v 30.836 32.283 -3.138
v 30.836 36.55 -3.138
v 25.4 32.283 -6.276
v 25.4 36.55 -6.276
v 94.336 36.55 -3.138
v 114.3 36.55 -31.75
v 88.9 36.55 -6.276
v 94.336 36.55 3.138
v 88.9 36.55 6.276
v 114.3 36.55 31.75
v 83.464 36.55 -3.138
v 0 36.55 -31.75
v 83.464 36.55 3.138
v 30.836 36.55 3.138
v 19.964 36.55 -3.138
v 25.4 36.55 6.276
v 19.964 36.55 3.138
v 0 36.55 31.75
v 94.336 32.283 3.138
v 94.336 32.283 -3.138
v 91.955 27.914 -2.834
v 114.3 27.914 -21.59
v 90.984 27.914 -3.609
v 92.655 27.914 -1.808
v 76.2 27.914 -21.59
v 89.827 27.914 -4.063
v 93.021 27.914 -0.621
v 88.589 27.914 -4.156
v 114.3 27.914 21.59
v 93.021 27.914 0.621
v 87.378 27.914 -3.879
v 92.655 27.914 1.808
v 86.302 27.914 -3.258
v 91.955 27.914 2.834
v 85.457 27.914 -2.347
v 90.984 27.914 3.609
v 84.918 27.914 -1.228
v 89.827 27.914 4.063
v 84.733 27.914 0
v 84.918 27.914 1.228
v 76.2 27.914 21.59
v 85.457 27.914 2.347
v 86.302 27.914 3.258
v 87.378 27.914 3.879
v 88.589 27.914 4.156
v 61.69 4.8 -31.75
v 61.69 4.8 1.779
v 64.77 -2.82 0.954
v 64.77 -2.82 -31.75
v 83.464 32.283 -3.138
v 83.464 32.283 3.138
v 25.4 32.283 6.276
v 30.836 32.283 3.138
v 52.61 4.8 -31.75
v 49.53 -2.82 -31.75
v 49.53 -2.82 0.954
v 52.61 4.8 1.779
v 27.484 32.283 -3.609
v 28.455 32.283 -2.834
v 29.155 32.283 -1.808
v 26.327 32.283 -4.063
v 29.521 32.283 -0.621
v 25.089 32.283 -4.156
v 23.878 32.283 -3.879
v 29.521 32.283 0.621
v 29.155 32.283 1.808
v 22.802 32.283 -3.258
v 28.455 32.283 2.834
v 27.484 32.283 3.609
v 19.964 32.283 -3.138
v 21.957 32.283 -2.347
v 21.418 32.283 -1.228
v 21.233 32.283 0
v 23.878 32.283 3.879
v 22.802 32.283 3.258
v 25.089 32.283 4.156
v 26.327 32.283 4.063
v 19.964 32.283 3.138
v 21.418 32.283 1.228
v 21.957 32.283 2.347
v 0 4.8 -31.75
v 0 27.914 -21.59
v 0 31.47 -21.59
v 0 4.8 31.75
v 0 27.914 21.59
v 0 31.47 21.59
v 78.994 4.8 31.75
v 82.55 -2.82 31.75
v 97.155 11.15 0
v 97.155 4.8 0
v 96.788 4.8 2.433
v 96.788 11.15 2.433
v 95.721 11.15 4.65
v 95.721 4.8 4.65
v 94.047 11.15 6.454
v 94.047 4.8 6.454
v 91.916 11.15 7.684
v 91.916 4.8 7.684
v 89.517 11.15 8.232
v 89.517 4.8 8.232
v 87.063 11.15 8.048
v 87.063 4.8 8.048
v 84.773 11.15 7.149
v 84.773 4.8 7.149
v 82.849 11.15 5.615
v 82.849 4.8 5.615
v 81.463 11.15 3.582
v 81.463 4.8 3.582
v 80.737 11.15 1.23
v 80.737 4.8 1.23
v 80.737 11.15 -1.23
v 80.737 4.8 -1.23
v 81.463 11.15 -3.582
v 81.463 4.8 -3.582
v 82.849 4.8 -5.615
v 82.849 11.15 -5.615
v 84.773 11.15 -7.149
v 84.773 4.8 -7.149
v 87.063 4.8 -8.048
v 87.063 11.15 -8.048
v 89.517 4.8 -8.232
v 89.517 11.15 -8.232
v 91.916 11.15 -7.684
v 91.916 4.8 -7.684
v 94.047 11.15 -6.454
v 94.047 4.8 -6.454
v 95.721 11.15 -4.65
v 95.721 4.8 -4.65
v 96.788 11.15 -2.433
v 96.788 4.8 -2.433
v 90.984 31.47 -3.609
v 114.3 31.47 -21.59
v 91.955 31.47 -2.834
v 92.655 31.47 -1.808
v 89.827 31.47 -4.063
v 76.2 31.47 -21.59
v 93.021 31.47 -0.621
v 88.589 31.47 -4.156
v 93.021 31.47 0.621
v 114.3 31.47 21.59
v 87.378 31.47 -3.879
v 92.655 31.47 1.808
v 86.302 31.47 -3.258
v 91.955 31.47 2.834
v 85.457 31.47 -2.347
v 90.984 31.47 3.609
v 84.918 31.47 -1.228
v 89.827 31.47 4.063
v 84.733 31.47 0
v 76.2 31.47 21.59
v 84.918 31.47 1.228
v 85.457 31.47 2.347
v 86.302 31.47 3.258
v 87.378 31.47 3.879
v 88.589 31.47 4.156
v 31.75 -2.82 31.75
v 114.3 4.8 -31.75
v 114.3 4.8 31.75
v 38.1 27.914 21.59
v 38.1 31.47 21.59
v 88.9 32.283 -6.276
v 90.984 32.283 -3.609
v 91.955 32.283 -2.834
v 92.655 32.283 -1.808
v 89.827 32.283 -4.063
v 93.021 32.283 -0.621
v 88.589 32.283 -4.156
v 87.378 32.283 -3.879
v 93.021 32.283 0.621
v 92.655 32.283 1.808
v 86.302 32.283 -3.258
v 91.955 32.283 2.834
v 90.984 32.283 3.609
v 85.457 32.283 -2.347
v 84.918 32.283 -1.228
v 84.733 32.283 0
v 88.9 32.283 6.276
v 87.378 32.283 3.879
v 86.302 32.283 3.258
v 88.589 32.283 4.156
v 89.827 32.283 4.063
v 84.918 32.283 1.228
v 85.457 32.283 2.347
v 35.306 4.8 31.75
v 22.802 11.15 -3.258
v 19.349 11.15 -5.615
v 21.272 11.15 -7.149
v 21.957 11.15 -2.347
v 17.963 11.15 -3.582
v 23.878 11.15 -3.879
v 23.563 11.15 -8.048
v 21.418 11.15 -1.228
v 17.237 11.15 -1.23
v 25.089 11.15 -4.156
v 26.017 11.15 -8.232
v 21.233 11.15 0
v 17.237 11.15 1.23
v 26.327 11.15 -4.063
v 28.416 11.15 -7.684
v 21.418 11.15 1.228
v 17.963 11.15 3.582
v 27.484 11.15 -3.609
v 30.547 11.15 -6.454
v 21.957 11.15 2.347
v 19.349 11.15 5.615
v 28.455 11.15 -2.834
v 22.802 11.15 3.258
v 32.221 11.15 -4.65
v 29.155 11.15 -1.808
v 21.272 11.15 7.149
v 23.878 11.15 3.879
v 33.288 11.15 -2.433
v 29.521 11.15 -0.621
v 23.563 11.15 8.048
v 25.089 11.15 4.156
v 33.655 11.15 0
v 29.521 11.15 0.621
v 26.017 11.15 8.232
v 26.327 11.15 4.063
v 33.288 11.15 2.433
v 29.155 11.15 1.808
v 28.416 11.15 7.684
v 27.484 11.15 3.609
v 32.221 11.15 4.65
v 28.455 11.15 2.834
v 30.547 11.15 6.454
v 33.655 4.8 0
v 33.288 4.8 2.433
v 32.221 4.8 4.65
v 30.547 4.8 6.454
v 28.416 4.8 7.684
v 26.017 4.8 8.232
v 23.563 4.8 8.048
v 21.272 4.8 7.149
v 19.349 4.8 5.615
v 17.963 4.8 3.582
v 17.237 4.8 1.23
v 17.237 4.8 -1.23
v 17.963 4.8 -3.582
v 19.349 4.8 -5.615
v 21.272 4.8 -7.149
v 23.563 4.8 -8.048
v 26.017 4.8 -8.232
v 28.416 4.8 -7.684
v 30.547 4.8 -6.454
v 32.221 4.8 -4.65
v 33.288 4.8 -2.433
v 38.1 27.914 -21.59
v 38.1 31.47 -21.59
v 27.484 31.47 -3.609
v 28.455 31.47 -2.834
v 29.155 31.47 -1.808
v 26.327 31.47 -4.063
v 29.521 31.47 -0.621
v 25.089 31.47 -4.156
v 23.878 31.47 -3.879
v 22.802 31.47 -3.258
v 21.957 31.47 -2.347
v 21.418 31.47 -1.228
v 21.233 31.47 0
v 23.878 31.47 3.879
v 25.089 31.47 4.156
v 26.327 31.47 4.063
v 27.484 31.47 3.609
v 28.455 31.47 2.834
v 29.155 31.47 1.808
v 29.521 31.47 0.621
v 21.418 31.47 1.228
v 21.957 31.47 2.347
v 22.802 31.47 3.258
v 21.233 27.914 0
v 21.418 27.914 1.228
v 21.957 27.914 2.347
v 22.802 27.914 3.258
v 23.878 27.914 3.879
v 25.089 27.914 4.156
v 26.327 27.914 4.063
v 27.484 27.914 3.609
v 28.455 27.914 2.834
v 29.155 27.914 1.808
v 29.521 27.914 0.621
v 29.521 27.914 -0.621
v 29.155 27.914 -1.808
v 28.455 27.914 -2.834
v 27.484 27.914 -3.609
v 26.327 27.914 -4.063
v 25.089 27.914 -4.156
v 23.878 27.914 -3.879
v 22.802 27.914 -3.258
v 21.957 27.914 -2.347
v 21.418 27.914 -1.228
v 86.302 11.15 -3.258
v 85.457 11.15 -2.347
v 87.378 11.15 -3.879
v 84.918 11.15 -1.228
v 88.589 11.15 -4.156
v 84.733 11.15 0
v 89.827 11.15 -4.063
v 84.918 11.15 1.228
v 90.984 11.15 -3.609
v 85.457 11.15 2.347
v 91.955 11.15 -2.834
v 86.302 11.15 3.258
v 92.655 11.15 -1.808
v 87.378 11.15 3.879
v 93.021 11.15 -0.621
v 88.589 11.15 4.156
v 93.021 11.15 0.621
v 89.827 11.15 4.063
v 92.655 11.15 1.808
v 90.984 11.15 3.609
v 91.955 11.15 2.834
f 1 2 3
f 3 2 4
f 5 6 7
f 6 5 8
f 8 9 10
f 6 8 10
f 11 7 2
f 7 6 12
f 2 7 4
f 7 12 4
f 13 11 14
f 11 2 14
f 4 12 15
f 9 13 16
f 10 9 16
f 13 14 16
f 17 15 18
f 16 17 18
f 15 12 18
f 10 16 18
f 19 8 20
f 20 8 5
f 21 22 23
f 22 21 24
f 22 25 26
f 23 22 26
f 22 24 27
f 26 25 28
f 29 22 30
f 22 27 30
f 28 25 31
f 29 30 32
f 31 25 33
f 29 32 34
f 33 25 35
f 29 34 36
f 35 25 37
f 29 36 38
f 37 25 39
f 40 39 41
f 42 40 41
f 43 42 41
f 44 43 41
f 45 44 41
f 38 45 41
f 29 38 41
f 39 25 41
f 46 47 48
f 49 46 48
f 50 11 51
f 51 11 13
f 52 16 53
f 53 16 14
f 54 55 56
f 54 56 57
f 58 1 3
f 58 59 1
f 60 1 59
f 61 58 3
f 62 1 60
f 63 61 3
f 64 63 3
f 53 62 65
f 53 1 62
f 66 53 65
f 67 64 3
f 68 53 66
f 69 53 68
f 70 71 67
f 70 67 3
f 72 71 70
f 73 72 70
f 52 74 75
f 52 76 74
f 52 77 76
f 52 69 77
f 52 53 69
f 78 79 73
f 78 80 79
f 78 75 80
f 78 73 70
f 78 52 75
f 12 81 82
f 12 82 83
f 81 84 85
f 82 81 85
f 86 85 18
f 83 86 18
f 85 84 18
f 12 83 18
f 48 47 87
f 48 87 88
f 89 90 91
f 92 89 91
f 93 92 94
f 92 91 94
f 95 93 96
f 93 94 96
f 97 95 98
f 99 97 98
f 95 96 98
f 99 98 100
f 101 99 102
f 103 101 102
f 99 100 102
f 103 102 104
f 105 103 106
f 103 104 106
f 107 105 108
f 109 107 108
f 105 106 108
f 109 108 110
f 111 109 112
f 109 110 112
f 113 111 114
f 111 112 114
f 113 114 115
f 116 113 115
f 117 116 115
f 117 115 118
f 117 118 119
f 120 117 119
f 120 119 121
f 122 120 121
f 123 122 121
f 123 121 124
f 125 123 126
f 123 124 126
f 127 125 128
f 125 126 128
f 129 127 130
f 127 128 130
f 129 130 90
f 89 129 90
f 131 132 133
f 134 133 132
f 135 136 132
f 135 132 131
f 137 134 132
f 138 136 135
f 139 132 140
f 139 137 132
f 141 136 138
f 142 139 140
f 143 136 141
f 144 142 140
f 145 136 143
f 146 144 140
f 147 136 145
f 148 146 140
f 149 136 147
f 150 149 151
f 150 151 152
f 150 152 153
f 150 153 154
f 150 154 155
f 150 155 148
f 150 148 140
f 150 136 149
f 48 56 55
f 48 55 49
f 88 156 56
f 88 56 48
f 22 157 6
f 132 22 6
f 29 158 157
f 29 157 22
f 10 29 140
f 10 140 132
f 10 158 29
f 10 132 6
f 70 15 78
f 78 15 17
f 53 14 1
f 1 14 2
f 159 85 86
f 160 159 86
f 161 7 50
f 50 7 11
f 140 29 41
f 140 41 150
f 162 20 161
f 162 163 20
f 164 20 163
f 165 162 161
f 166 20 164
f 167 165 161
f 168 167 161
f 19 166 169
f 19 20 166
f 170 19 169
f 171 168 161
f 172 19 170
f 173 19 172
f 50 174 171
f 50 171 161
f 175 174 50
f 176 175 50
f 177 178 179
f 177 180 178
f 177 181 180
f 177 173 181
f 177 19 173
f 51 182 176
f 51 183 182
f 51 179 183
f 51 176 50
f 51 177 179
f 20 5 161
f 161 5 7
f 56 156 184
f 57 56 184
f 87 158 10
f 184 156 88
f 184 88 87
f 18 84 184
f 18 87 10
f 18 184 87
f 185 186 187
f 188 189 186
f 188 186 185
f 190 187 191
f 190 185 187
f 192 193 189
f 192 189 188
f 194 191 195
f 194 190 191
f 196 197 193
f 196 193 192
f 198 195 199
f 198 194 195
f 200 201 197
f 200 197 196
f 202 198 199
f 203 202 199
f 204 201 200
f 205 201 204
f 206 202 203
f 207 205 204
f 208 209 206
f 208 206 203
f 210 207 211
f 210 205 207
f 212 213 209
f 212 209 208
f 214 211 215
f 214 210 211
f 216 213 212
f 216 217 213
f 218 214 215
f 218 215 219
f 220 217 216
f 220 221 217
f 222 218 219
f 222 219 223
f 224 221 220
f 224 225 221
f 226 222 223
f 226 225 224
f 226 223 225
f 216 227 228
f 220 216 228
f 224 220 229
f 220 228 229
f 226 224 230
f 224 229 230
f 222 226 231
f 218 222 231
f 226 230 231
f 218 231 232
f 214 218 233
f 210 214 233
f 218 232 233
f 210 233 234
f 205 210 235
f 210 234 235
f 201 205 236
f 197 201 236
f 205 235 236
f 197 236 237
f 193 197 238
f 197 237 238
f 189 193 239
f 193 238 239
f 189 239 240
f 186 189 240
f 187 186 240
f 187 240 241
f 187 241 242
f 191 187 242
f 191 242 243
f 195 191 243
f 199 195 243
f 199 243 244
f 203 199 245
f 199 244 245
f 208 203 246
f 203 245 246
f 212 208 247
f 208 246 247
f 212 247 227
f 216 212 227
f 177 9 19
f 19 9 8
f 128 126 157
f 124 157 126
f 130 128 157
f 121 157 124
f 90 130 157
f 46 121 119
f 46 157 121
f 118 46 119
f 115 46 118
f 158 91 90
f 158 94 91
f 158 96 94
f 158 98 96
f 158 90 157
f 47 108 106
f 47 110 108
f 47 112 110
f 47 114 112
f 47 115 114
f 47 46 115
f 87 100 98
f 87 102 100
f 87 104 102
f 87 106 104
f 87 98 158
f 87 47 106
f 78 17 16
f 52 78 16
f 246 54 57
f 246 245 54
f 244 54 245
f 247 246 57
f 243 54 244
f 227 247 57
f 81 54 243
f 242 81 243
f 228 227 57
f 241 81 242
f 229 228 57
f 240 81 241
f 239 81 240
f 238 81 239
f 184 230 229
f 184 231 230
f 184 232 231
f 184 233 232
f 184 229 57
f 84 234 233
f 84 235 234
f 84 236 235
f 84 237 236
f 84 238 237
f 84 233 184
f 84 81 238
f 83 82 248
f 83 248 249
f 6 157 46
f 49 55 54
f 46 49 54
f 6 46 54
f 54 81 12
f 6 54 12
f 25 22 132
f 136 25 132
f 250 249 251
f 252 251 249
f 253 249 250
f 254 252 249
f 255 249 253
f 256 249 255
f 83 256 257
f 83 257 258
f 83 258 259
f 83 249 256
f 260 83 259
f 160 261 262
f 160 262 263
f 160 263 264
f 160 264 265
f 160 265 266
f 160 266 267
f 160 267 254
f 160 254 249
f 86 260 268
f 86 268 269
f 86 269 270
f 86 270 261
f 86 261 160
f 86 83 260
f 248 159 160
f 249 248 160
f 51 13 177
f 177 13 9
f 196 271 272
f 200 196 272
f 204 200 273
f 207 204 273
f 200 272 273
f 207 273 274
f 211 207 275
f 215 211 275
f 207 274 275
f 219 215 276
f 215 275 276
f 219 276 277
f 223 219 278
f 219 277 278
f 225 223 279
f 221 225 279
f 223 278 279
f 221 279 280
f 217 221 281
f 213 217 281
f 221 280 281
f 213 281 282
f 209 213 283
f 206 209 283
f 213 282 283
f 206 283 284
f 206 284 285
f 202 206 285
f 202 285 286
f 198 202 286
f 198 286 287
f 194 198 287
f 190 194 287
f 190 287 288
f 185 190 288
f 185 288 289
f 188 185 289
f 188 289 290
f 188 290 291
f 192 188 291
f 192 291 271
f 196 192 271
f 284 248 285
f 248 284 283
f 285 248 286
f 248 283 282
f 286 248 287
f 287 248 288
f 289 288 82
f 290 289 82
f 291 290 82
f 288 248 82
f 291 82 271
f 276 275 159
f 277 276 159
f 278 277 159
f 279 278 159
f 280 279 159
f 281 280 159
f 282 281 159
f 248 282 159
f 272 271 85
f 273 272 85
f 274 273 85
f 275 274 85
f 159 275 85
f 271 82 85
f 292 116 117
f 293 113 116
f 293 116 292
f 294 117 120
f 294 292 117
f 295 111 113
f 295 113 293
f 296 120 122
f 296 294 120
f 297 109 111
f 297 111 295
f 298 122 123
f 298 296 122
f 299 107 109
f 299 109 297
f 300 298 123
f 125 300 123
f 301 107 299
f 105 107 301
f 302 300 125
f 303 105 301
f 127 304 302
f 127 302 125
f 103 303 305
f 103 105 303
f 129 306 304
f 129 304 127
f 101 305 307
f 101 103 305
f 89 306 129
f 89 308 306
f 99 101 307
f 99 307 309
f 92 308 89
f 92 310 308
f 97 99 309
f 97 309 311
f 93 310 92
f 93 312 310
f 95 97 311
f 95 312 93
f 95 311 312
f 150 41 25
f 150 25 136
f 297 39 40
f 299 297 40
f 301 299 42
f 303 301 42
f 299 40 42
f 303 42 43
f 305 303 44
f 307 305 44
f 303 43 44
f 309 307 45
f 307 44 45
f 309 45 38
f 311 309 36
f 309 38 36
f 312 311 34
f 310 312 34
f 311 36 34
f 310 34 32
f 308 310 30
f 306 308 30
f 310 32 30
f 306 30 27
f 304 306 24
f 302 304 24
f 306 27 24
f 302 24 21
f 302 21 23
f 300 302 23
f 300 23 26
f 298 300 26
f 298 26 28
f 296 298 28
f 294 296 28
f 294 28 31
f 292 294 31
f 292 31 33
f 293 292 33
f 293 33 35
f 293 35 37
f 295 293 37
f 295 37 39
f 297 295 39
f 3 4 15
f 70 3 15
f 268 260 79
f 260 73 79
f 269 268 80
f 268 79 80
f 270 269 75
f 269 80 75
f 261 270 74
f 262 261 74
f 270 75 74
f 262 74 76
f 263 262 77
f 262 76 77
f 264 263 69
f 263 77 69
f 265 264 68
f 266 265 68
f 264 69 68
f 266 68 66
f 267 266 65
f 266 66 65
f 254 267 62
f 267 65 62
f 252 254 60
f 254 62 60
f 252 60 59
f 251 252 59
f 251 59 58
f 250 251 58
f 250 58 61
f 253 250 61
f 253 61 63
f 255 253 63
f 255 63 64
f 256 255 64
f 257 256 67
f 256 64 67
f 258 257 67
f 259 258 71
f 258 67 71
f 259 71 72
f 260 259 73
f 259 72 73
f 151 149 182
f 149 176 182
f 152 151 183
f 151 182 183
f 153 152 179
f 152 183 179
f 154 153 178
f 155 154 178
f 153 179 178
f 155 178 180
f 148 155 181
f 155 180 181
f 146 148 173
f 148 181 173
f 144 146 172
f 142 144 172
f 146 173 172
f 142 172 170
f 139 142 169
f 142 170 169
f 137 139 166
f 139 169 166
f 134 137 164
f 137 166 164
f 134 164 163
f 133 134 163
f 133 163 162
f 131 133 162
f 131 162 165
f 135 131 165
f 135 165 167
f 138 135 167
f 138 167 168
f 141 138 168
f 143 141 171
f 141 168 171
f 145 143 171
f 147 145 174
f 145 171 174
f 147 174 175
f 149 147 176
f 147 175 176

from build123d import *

# Parameters (mm, degrees)
F0_W      = 31.75
F0_H      = 63.5
F1_DEPTH  = 114.3
F2_DEPTH  = 114.3
F4_D      = 8.334375
F4_2_D    = 8.334375
F7_DEPTH  = 7.62
F8_W      = 3.556
F8_H      = 43.18
F9_DEPTH  = 38.1
F10_START = 76.2
F10_DEPTH = 38.1
F14_R     = 8.255
F14_R_2   = 4.1671875
F15_R     = 8.255
F15_R_2   = 4.1671875
F16_DEPTH = 6.35
F17_R     = 4.1671875
F18_DEPTH = 4.2672


# Not quite as in the source:
# - a length typed as a fraction of an inch, garbled in the dataset ("3 / 203.2 mm" for 3/8 in), is restored


with BuildPart() as f1:
    # F0 (on Right) → F1 (new body)
    with BuildSketch(Plane.YZ):
        with Locations((20.6751725854, 0)):
            Rectangle(F0_W, F0_H)
    extrude(amount=F1_DEPTH)

    # F4 (through all)
    with Locations(Plane.XZ.offset(26.9498274146)):
        with Locations((25.4, 0), (88.9, 0)):
            Hole(F4_D / 2)

    # F6 (on face) → F7 (join)
    with BuildSketch(Plane.XZ.offset(-4.8001725854)):
        Polygon((57.15, -31.75), (57.15, 31.75), (31.75, 31.75), (49.53, 0.9541366414), (49.53, -31.75), align=None)
        Polygon((82.55, 31.75), (57.15, 31.75), (57.15, -31.75), (64.77, -31.75), (64.77, 0.9541366414), align=None)
    extrude(amount=F7_DEPTH)

    # F8 (on face) → F9 (cut)
    with BuildSketch(Plane.YZ):
        with Locations((29.6921725854, 0)):
            Rectangle(F8_W, F8_H)
    extrude(amount=F9_DEPTH, mode=Mode.SUBTRACT)

    # F8 (on face) → F10 (cut)
    with BuildSketch(Plane.YZ.offset(F10_START)):
        with Locations((29.6921725854, 0)):
            Rectangle(F8_W, F8_H)
    extrude(amount=F10_DEPTH, mode=Mode.SUBTRACT)

    # F12: sweep along a path in F12_path
    with BuildLine(Plane(origin=(31.75, -2.8198274146, 31.75), x_dir=(0, 0, 1), z_dir=(0, -1, 0))) as f12_path:
        Line((0, 0), (-30.7958633586, -17.78))
        Line((-30.7958633586, -17.78), (-63.5, -17.78))
    # F11 (on face) → F12 (sweep, cut)
    with BuildSketch(Plane.XY.offset(31.75)):
        Polygon((35.306, 4.8001725854), (31.75, 4.8001725854), (31.75, -2.8198274146), align=None)
    sweep(path=f12_path.line, transition=Transition.RIGHT, mode=Mode.SUBTRACT)

    # F13: sweep along a path in F13_path
    with BuildLine(Plane(origin=(82.55, -2.8198274146, 31.75), x_dir=(0, 0, -1), z_dir=(0, 1, 0))) as f13_path:
        Line((0, 0), (30.7958633586, 17.78))
        Line((30.7958633586, 17.78), (63.5, 17.78))
    # F11 (on face) → F13 (sweep, cut)
    with BuildSketch(Plane.XY.offset(31.75)):
        Polygon((78.994, 4.8001725854), (82.55, -2.8198274146), (82.55, 4.8001725854), align=None)
    sweep(path=f13_path.line, transition=Transition.RIGHT, mode=Mode.SUBTRACT)

    # F14 (on face) + F15 (on face) → F16 (cut)
    with BuildSketch(Plane.XZ.offset(-4.8001725854)):
        with Locations((25.4, 0)):
            Circle(F14_R)
        with Locations((25.4, 0)):
            Circle(F14_R_2, mode=Mode.SUBTRACT)
    with BuildSketch(Plane.XZ.offset(-4.8001725854)):
        with Locations((88.9, 0)):
            Circle(F15_R)
        with Locations((88.9, 0)):
            Circle(F15_R_2, mode=Mode.SUBTRACT)
    extrude(amount=-F16_DEPTH, mode=Mode.SUBTRACT)

    # F17 (on face) → F18 (cut)
    with BuildSketch(Plane(origin=(0, 36.5501725854, 0), x_dir=(-1, 0, 0), z_dir=(0, 1, 0))):
        Polygon((-83.4644, -3.1382451232), (-83.4644, 3.1382451232), (-88.9, 6.2764902464), (-94.3356, 3.1382451232), (-94.3356, -3.1382451232), (-88.9, -6.2764902464), align=None)
        with Locations((-88.9, 0)):
            Circle(F17_R, mode=Mode.SUBTRACT)
        Polygon((-30.8356, 3.1382451232), (-30.8356, -3.1382451232), (-25.4, -6.2764902464), (-19.9644, -3.1382451232), (-19.9644, 3.1382451232), (-25.4, 6.2764902464), align=None)
        with Locations((-25.4, 0)):
            Circle(F17_R, mode=Mode.SUBTRACT)
    extrude(amount=-F18_DEPTH, mode=Mode.SUBTRACT)


with BuildPart() as f2:
    # F0 (on Right) → F2 (new body)
    with BuildSketch(Plane.YZ):
        Polygon((-26.9498274146, -19.685), (-26.9498274146, -31.75), (4.8001725854, -31.75), (4.8001725854, 31.75), (-26.9498274146, 31.75), (-26.9498274146, 19.685), (-23.3938274146, 19.685), (-7.8998274146, 8.89), (-7.8998274146, -8.89), (-23.3938274146, -19.685), align=None)
        Polygon((-26.9498274146, 19.685), (-26.9498274146, -19.685), (-23.3938274146, -19.685), (-7.8998274146, -8.89), (-7.8998274146, 8.89), (-23.3938274146, 19.685), align=None)
    extrude(amount=F2_DEPTH)

    # F4#2 (through all)
    with Locations(Plane.XZ.offset(26.9498274146)):
        with Locations((25.4, 0), (88.9, 0)):
            Hole(F4_2_D / 2)


solid = f1.part
